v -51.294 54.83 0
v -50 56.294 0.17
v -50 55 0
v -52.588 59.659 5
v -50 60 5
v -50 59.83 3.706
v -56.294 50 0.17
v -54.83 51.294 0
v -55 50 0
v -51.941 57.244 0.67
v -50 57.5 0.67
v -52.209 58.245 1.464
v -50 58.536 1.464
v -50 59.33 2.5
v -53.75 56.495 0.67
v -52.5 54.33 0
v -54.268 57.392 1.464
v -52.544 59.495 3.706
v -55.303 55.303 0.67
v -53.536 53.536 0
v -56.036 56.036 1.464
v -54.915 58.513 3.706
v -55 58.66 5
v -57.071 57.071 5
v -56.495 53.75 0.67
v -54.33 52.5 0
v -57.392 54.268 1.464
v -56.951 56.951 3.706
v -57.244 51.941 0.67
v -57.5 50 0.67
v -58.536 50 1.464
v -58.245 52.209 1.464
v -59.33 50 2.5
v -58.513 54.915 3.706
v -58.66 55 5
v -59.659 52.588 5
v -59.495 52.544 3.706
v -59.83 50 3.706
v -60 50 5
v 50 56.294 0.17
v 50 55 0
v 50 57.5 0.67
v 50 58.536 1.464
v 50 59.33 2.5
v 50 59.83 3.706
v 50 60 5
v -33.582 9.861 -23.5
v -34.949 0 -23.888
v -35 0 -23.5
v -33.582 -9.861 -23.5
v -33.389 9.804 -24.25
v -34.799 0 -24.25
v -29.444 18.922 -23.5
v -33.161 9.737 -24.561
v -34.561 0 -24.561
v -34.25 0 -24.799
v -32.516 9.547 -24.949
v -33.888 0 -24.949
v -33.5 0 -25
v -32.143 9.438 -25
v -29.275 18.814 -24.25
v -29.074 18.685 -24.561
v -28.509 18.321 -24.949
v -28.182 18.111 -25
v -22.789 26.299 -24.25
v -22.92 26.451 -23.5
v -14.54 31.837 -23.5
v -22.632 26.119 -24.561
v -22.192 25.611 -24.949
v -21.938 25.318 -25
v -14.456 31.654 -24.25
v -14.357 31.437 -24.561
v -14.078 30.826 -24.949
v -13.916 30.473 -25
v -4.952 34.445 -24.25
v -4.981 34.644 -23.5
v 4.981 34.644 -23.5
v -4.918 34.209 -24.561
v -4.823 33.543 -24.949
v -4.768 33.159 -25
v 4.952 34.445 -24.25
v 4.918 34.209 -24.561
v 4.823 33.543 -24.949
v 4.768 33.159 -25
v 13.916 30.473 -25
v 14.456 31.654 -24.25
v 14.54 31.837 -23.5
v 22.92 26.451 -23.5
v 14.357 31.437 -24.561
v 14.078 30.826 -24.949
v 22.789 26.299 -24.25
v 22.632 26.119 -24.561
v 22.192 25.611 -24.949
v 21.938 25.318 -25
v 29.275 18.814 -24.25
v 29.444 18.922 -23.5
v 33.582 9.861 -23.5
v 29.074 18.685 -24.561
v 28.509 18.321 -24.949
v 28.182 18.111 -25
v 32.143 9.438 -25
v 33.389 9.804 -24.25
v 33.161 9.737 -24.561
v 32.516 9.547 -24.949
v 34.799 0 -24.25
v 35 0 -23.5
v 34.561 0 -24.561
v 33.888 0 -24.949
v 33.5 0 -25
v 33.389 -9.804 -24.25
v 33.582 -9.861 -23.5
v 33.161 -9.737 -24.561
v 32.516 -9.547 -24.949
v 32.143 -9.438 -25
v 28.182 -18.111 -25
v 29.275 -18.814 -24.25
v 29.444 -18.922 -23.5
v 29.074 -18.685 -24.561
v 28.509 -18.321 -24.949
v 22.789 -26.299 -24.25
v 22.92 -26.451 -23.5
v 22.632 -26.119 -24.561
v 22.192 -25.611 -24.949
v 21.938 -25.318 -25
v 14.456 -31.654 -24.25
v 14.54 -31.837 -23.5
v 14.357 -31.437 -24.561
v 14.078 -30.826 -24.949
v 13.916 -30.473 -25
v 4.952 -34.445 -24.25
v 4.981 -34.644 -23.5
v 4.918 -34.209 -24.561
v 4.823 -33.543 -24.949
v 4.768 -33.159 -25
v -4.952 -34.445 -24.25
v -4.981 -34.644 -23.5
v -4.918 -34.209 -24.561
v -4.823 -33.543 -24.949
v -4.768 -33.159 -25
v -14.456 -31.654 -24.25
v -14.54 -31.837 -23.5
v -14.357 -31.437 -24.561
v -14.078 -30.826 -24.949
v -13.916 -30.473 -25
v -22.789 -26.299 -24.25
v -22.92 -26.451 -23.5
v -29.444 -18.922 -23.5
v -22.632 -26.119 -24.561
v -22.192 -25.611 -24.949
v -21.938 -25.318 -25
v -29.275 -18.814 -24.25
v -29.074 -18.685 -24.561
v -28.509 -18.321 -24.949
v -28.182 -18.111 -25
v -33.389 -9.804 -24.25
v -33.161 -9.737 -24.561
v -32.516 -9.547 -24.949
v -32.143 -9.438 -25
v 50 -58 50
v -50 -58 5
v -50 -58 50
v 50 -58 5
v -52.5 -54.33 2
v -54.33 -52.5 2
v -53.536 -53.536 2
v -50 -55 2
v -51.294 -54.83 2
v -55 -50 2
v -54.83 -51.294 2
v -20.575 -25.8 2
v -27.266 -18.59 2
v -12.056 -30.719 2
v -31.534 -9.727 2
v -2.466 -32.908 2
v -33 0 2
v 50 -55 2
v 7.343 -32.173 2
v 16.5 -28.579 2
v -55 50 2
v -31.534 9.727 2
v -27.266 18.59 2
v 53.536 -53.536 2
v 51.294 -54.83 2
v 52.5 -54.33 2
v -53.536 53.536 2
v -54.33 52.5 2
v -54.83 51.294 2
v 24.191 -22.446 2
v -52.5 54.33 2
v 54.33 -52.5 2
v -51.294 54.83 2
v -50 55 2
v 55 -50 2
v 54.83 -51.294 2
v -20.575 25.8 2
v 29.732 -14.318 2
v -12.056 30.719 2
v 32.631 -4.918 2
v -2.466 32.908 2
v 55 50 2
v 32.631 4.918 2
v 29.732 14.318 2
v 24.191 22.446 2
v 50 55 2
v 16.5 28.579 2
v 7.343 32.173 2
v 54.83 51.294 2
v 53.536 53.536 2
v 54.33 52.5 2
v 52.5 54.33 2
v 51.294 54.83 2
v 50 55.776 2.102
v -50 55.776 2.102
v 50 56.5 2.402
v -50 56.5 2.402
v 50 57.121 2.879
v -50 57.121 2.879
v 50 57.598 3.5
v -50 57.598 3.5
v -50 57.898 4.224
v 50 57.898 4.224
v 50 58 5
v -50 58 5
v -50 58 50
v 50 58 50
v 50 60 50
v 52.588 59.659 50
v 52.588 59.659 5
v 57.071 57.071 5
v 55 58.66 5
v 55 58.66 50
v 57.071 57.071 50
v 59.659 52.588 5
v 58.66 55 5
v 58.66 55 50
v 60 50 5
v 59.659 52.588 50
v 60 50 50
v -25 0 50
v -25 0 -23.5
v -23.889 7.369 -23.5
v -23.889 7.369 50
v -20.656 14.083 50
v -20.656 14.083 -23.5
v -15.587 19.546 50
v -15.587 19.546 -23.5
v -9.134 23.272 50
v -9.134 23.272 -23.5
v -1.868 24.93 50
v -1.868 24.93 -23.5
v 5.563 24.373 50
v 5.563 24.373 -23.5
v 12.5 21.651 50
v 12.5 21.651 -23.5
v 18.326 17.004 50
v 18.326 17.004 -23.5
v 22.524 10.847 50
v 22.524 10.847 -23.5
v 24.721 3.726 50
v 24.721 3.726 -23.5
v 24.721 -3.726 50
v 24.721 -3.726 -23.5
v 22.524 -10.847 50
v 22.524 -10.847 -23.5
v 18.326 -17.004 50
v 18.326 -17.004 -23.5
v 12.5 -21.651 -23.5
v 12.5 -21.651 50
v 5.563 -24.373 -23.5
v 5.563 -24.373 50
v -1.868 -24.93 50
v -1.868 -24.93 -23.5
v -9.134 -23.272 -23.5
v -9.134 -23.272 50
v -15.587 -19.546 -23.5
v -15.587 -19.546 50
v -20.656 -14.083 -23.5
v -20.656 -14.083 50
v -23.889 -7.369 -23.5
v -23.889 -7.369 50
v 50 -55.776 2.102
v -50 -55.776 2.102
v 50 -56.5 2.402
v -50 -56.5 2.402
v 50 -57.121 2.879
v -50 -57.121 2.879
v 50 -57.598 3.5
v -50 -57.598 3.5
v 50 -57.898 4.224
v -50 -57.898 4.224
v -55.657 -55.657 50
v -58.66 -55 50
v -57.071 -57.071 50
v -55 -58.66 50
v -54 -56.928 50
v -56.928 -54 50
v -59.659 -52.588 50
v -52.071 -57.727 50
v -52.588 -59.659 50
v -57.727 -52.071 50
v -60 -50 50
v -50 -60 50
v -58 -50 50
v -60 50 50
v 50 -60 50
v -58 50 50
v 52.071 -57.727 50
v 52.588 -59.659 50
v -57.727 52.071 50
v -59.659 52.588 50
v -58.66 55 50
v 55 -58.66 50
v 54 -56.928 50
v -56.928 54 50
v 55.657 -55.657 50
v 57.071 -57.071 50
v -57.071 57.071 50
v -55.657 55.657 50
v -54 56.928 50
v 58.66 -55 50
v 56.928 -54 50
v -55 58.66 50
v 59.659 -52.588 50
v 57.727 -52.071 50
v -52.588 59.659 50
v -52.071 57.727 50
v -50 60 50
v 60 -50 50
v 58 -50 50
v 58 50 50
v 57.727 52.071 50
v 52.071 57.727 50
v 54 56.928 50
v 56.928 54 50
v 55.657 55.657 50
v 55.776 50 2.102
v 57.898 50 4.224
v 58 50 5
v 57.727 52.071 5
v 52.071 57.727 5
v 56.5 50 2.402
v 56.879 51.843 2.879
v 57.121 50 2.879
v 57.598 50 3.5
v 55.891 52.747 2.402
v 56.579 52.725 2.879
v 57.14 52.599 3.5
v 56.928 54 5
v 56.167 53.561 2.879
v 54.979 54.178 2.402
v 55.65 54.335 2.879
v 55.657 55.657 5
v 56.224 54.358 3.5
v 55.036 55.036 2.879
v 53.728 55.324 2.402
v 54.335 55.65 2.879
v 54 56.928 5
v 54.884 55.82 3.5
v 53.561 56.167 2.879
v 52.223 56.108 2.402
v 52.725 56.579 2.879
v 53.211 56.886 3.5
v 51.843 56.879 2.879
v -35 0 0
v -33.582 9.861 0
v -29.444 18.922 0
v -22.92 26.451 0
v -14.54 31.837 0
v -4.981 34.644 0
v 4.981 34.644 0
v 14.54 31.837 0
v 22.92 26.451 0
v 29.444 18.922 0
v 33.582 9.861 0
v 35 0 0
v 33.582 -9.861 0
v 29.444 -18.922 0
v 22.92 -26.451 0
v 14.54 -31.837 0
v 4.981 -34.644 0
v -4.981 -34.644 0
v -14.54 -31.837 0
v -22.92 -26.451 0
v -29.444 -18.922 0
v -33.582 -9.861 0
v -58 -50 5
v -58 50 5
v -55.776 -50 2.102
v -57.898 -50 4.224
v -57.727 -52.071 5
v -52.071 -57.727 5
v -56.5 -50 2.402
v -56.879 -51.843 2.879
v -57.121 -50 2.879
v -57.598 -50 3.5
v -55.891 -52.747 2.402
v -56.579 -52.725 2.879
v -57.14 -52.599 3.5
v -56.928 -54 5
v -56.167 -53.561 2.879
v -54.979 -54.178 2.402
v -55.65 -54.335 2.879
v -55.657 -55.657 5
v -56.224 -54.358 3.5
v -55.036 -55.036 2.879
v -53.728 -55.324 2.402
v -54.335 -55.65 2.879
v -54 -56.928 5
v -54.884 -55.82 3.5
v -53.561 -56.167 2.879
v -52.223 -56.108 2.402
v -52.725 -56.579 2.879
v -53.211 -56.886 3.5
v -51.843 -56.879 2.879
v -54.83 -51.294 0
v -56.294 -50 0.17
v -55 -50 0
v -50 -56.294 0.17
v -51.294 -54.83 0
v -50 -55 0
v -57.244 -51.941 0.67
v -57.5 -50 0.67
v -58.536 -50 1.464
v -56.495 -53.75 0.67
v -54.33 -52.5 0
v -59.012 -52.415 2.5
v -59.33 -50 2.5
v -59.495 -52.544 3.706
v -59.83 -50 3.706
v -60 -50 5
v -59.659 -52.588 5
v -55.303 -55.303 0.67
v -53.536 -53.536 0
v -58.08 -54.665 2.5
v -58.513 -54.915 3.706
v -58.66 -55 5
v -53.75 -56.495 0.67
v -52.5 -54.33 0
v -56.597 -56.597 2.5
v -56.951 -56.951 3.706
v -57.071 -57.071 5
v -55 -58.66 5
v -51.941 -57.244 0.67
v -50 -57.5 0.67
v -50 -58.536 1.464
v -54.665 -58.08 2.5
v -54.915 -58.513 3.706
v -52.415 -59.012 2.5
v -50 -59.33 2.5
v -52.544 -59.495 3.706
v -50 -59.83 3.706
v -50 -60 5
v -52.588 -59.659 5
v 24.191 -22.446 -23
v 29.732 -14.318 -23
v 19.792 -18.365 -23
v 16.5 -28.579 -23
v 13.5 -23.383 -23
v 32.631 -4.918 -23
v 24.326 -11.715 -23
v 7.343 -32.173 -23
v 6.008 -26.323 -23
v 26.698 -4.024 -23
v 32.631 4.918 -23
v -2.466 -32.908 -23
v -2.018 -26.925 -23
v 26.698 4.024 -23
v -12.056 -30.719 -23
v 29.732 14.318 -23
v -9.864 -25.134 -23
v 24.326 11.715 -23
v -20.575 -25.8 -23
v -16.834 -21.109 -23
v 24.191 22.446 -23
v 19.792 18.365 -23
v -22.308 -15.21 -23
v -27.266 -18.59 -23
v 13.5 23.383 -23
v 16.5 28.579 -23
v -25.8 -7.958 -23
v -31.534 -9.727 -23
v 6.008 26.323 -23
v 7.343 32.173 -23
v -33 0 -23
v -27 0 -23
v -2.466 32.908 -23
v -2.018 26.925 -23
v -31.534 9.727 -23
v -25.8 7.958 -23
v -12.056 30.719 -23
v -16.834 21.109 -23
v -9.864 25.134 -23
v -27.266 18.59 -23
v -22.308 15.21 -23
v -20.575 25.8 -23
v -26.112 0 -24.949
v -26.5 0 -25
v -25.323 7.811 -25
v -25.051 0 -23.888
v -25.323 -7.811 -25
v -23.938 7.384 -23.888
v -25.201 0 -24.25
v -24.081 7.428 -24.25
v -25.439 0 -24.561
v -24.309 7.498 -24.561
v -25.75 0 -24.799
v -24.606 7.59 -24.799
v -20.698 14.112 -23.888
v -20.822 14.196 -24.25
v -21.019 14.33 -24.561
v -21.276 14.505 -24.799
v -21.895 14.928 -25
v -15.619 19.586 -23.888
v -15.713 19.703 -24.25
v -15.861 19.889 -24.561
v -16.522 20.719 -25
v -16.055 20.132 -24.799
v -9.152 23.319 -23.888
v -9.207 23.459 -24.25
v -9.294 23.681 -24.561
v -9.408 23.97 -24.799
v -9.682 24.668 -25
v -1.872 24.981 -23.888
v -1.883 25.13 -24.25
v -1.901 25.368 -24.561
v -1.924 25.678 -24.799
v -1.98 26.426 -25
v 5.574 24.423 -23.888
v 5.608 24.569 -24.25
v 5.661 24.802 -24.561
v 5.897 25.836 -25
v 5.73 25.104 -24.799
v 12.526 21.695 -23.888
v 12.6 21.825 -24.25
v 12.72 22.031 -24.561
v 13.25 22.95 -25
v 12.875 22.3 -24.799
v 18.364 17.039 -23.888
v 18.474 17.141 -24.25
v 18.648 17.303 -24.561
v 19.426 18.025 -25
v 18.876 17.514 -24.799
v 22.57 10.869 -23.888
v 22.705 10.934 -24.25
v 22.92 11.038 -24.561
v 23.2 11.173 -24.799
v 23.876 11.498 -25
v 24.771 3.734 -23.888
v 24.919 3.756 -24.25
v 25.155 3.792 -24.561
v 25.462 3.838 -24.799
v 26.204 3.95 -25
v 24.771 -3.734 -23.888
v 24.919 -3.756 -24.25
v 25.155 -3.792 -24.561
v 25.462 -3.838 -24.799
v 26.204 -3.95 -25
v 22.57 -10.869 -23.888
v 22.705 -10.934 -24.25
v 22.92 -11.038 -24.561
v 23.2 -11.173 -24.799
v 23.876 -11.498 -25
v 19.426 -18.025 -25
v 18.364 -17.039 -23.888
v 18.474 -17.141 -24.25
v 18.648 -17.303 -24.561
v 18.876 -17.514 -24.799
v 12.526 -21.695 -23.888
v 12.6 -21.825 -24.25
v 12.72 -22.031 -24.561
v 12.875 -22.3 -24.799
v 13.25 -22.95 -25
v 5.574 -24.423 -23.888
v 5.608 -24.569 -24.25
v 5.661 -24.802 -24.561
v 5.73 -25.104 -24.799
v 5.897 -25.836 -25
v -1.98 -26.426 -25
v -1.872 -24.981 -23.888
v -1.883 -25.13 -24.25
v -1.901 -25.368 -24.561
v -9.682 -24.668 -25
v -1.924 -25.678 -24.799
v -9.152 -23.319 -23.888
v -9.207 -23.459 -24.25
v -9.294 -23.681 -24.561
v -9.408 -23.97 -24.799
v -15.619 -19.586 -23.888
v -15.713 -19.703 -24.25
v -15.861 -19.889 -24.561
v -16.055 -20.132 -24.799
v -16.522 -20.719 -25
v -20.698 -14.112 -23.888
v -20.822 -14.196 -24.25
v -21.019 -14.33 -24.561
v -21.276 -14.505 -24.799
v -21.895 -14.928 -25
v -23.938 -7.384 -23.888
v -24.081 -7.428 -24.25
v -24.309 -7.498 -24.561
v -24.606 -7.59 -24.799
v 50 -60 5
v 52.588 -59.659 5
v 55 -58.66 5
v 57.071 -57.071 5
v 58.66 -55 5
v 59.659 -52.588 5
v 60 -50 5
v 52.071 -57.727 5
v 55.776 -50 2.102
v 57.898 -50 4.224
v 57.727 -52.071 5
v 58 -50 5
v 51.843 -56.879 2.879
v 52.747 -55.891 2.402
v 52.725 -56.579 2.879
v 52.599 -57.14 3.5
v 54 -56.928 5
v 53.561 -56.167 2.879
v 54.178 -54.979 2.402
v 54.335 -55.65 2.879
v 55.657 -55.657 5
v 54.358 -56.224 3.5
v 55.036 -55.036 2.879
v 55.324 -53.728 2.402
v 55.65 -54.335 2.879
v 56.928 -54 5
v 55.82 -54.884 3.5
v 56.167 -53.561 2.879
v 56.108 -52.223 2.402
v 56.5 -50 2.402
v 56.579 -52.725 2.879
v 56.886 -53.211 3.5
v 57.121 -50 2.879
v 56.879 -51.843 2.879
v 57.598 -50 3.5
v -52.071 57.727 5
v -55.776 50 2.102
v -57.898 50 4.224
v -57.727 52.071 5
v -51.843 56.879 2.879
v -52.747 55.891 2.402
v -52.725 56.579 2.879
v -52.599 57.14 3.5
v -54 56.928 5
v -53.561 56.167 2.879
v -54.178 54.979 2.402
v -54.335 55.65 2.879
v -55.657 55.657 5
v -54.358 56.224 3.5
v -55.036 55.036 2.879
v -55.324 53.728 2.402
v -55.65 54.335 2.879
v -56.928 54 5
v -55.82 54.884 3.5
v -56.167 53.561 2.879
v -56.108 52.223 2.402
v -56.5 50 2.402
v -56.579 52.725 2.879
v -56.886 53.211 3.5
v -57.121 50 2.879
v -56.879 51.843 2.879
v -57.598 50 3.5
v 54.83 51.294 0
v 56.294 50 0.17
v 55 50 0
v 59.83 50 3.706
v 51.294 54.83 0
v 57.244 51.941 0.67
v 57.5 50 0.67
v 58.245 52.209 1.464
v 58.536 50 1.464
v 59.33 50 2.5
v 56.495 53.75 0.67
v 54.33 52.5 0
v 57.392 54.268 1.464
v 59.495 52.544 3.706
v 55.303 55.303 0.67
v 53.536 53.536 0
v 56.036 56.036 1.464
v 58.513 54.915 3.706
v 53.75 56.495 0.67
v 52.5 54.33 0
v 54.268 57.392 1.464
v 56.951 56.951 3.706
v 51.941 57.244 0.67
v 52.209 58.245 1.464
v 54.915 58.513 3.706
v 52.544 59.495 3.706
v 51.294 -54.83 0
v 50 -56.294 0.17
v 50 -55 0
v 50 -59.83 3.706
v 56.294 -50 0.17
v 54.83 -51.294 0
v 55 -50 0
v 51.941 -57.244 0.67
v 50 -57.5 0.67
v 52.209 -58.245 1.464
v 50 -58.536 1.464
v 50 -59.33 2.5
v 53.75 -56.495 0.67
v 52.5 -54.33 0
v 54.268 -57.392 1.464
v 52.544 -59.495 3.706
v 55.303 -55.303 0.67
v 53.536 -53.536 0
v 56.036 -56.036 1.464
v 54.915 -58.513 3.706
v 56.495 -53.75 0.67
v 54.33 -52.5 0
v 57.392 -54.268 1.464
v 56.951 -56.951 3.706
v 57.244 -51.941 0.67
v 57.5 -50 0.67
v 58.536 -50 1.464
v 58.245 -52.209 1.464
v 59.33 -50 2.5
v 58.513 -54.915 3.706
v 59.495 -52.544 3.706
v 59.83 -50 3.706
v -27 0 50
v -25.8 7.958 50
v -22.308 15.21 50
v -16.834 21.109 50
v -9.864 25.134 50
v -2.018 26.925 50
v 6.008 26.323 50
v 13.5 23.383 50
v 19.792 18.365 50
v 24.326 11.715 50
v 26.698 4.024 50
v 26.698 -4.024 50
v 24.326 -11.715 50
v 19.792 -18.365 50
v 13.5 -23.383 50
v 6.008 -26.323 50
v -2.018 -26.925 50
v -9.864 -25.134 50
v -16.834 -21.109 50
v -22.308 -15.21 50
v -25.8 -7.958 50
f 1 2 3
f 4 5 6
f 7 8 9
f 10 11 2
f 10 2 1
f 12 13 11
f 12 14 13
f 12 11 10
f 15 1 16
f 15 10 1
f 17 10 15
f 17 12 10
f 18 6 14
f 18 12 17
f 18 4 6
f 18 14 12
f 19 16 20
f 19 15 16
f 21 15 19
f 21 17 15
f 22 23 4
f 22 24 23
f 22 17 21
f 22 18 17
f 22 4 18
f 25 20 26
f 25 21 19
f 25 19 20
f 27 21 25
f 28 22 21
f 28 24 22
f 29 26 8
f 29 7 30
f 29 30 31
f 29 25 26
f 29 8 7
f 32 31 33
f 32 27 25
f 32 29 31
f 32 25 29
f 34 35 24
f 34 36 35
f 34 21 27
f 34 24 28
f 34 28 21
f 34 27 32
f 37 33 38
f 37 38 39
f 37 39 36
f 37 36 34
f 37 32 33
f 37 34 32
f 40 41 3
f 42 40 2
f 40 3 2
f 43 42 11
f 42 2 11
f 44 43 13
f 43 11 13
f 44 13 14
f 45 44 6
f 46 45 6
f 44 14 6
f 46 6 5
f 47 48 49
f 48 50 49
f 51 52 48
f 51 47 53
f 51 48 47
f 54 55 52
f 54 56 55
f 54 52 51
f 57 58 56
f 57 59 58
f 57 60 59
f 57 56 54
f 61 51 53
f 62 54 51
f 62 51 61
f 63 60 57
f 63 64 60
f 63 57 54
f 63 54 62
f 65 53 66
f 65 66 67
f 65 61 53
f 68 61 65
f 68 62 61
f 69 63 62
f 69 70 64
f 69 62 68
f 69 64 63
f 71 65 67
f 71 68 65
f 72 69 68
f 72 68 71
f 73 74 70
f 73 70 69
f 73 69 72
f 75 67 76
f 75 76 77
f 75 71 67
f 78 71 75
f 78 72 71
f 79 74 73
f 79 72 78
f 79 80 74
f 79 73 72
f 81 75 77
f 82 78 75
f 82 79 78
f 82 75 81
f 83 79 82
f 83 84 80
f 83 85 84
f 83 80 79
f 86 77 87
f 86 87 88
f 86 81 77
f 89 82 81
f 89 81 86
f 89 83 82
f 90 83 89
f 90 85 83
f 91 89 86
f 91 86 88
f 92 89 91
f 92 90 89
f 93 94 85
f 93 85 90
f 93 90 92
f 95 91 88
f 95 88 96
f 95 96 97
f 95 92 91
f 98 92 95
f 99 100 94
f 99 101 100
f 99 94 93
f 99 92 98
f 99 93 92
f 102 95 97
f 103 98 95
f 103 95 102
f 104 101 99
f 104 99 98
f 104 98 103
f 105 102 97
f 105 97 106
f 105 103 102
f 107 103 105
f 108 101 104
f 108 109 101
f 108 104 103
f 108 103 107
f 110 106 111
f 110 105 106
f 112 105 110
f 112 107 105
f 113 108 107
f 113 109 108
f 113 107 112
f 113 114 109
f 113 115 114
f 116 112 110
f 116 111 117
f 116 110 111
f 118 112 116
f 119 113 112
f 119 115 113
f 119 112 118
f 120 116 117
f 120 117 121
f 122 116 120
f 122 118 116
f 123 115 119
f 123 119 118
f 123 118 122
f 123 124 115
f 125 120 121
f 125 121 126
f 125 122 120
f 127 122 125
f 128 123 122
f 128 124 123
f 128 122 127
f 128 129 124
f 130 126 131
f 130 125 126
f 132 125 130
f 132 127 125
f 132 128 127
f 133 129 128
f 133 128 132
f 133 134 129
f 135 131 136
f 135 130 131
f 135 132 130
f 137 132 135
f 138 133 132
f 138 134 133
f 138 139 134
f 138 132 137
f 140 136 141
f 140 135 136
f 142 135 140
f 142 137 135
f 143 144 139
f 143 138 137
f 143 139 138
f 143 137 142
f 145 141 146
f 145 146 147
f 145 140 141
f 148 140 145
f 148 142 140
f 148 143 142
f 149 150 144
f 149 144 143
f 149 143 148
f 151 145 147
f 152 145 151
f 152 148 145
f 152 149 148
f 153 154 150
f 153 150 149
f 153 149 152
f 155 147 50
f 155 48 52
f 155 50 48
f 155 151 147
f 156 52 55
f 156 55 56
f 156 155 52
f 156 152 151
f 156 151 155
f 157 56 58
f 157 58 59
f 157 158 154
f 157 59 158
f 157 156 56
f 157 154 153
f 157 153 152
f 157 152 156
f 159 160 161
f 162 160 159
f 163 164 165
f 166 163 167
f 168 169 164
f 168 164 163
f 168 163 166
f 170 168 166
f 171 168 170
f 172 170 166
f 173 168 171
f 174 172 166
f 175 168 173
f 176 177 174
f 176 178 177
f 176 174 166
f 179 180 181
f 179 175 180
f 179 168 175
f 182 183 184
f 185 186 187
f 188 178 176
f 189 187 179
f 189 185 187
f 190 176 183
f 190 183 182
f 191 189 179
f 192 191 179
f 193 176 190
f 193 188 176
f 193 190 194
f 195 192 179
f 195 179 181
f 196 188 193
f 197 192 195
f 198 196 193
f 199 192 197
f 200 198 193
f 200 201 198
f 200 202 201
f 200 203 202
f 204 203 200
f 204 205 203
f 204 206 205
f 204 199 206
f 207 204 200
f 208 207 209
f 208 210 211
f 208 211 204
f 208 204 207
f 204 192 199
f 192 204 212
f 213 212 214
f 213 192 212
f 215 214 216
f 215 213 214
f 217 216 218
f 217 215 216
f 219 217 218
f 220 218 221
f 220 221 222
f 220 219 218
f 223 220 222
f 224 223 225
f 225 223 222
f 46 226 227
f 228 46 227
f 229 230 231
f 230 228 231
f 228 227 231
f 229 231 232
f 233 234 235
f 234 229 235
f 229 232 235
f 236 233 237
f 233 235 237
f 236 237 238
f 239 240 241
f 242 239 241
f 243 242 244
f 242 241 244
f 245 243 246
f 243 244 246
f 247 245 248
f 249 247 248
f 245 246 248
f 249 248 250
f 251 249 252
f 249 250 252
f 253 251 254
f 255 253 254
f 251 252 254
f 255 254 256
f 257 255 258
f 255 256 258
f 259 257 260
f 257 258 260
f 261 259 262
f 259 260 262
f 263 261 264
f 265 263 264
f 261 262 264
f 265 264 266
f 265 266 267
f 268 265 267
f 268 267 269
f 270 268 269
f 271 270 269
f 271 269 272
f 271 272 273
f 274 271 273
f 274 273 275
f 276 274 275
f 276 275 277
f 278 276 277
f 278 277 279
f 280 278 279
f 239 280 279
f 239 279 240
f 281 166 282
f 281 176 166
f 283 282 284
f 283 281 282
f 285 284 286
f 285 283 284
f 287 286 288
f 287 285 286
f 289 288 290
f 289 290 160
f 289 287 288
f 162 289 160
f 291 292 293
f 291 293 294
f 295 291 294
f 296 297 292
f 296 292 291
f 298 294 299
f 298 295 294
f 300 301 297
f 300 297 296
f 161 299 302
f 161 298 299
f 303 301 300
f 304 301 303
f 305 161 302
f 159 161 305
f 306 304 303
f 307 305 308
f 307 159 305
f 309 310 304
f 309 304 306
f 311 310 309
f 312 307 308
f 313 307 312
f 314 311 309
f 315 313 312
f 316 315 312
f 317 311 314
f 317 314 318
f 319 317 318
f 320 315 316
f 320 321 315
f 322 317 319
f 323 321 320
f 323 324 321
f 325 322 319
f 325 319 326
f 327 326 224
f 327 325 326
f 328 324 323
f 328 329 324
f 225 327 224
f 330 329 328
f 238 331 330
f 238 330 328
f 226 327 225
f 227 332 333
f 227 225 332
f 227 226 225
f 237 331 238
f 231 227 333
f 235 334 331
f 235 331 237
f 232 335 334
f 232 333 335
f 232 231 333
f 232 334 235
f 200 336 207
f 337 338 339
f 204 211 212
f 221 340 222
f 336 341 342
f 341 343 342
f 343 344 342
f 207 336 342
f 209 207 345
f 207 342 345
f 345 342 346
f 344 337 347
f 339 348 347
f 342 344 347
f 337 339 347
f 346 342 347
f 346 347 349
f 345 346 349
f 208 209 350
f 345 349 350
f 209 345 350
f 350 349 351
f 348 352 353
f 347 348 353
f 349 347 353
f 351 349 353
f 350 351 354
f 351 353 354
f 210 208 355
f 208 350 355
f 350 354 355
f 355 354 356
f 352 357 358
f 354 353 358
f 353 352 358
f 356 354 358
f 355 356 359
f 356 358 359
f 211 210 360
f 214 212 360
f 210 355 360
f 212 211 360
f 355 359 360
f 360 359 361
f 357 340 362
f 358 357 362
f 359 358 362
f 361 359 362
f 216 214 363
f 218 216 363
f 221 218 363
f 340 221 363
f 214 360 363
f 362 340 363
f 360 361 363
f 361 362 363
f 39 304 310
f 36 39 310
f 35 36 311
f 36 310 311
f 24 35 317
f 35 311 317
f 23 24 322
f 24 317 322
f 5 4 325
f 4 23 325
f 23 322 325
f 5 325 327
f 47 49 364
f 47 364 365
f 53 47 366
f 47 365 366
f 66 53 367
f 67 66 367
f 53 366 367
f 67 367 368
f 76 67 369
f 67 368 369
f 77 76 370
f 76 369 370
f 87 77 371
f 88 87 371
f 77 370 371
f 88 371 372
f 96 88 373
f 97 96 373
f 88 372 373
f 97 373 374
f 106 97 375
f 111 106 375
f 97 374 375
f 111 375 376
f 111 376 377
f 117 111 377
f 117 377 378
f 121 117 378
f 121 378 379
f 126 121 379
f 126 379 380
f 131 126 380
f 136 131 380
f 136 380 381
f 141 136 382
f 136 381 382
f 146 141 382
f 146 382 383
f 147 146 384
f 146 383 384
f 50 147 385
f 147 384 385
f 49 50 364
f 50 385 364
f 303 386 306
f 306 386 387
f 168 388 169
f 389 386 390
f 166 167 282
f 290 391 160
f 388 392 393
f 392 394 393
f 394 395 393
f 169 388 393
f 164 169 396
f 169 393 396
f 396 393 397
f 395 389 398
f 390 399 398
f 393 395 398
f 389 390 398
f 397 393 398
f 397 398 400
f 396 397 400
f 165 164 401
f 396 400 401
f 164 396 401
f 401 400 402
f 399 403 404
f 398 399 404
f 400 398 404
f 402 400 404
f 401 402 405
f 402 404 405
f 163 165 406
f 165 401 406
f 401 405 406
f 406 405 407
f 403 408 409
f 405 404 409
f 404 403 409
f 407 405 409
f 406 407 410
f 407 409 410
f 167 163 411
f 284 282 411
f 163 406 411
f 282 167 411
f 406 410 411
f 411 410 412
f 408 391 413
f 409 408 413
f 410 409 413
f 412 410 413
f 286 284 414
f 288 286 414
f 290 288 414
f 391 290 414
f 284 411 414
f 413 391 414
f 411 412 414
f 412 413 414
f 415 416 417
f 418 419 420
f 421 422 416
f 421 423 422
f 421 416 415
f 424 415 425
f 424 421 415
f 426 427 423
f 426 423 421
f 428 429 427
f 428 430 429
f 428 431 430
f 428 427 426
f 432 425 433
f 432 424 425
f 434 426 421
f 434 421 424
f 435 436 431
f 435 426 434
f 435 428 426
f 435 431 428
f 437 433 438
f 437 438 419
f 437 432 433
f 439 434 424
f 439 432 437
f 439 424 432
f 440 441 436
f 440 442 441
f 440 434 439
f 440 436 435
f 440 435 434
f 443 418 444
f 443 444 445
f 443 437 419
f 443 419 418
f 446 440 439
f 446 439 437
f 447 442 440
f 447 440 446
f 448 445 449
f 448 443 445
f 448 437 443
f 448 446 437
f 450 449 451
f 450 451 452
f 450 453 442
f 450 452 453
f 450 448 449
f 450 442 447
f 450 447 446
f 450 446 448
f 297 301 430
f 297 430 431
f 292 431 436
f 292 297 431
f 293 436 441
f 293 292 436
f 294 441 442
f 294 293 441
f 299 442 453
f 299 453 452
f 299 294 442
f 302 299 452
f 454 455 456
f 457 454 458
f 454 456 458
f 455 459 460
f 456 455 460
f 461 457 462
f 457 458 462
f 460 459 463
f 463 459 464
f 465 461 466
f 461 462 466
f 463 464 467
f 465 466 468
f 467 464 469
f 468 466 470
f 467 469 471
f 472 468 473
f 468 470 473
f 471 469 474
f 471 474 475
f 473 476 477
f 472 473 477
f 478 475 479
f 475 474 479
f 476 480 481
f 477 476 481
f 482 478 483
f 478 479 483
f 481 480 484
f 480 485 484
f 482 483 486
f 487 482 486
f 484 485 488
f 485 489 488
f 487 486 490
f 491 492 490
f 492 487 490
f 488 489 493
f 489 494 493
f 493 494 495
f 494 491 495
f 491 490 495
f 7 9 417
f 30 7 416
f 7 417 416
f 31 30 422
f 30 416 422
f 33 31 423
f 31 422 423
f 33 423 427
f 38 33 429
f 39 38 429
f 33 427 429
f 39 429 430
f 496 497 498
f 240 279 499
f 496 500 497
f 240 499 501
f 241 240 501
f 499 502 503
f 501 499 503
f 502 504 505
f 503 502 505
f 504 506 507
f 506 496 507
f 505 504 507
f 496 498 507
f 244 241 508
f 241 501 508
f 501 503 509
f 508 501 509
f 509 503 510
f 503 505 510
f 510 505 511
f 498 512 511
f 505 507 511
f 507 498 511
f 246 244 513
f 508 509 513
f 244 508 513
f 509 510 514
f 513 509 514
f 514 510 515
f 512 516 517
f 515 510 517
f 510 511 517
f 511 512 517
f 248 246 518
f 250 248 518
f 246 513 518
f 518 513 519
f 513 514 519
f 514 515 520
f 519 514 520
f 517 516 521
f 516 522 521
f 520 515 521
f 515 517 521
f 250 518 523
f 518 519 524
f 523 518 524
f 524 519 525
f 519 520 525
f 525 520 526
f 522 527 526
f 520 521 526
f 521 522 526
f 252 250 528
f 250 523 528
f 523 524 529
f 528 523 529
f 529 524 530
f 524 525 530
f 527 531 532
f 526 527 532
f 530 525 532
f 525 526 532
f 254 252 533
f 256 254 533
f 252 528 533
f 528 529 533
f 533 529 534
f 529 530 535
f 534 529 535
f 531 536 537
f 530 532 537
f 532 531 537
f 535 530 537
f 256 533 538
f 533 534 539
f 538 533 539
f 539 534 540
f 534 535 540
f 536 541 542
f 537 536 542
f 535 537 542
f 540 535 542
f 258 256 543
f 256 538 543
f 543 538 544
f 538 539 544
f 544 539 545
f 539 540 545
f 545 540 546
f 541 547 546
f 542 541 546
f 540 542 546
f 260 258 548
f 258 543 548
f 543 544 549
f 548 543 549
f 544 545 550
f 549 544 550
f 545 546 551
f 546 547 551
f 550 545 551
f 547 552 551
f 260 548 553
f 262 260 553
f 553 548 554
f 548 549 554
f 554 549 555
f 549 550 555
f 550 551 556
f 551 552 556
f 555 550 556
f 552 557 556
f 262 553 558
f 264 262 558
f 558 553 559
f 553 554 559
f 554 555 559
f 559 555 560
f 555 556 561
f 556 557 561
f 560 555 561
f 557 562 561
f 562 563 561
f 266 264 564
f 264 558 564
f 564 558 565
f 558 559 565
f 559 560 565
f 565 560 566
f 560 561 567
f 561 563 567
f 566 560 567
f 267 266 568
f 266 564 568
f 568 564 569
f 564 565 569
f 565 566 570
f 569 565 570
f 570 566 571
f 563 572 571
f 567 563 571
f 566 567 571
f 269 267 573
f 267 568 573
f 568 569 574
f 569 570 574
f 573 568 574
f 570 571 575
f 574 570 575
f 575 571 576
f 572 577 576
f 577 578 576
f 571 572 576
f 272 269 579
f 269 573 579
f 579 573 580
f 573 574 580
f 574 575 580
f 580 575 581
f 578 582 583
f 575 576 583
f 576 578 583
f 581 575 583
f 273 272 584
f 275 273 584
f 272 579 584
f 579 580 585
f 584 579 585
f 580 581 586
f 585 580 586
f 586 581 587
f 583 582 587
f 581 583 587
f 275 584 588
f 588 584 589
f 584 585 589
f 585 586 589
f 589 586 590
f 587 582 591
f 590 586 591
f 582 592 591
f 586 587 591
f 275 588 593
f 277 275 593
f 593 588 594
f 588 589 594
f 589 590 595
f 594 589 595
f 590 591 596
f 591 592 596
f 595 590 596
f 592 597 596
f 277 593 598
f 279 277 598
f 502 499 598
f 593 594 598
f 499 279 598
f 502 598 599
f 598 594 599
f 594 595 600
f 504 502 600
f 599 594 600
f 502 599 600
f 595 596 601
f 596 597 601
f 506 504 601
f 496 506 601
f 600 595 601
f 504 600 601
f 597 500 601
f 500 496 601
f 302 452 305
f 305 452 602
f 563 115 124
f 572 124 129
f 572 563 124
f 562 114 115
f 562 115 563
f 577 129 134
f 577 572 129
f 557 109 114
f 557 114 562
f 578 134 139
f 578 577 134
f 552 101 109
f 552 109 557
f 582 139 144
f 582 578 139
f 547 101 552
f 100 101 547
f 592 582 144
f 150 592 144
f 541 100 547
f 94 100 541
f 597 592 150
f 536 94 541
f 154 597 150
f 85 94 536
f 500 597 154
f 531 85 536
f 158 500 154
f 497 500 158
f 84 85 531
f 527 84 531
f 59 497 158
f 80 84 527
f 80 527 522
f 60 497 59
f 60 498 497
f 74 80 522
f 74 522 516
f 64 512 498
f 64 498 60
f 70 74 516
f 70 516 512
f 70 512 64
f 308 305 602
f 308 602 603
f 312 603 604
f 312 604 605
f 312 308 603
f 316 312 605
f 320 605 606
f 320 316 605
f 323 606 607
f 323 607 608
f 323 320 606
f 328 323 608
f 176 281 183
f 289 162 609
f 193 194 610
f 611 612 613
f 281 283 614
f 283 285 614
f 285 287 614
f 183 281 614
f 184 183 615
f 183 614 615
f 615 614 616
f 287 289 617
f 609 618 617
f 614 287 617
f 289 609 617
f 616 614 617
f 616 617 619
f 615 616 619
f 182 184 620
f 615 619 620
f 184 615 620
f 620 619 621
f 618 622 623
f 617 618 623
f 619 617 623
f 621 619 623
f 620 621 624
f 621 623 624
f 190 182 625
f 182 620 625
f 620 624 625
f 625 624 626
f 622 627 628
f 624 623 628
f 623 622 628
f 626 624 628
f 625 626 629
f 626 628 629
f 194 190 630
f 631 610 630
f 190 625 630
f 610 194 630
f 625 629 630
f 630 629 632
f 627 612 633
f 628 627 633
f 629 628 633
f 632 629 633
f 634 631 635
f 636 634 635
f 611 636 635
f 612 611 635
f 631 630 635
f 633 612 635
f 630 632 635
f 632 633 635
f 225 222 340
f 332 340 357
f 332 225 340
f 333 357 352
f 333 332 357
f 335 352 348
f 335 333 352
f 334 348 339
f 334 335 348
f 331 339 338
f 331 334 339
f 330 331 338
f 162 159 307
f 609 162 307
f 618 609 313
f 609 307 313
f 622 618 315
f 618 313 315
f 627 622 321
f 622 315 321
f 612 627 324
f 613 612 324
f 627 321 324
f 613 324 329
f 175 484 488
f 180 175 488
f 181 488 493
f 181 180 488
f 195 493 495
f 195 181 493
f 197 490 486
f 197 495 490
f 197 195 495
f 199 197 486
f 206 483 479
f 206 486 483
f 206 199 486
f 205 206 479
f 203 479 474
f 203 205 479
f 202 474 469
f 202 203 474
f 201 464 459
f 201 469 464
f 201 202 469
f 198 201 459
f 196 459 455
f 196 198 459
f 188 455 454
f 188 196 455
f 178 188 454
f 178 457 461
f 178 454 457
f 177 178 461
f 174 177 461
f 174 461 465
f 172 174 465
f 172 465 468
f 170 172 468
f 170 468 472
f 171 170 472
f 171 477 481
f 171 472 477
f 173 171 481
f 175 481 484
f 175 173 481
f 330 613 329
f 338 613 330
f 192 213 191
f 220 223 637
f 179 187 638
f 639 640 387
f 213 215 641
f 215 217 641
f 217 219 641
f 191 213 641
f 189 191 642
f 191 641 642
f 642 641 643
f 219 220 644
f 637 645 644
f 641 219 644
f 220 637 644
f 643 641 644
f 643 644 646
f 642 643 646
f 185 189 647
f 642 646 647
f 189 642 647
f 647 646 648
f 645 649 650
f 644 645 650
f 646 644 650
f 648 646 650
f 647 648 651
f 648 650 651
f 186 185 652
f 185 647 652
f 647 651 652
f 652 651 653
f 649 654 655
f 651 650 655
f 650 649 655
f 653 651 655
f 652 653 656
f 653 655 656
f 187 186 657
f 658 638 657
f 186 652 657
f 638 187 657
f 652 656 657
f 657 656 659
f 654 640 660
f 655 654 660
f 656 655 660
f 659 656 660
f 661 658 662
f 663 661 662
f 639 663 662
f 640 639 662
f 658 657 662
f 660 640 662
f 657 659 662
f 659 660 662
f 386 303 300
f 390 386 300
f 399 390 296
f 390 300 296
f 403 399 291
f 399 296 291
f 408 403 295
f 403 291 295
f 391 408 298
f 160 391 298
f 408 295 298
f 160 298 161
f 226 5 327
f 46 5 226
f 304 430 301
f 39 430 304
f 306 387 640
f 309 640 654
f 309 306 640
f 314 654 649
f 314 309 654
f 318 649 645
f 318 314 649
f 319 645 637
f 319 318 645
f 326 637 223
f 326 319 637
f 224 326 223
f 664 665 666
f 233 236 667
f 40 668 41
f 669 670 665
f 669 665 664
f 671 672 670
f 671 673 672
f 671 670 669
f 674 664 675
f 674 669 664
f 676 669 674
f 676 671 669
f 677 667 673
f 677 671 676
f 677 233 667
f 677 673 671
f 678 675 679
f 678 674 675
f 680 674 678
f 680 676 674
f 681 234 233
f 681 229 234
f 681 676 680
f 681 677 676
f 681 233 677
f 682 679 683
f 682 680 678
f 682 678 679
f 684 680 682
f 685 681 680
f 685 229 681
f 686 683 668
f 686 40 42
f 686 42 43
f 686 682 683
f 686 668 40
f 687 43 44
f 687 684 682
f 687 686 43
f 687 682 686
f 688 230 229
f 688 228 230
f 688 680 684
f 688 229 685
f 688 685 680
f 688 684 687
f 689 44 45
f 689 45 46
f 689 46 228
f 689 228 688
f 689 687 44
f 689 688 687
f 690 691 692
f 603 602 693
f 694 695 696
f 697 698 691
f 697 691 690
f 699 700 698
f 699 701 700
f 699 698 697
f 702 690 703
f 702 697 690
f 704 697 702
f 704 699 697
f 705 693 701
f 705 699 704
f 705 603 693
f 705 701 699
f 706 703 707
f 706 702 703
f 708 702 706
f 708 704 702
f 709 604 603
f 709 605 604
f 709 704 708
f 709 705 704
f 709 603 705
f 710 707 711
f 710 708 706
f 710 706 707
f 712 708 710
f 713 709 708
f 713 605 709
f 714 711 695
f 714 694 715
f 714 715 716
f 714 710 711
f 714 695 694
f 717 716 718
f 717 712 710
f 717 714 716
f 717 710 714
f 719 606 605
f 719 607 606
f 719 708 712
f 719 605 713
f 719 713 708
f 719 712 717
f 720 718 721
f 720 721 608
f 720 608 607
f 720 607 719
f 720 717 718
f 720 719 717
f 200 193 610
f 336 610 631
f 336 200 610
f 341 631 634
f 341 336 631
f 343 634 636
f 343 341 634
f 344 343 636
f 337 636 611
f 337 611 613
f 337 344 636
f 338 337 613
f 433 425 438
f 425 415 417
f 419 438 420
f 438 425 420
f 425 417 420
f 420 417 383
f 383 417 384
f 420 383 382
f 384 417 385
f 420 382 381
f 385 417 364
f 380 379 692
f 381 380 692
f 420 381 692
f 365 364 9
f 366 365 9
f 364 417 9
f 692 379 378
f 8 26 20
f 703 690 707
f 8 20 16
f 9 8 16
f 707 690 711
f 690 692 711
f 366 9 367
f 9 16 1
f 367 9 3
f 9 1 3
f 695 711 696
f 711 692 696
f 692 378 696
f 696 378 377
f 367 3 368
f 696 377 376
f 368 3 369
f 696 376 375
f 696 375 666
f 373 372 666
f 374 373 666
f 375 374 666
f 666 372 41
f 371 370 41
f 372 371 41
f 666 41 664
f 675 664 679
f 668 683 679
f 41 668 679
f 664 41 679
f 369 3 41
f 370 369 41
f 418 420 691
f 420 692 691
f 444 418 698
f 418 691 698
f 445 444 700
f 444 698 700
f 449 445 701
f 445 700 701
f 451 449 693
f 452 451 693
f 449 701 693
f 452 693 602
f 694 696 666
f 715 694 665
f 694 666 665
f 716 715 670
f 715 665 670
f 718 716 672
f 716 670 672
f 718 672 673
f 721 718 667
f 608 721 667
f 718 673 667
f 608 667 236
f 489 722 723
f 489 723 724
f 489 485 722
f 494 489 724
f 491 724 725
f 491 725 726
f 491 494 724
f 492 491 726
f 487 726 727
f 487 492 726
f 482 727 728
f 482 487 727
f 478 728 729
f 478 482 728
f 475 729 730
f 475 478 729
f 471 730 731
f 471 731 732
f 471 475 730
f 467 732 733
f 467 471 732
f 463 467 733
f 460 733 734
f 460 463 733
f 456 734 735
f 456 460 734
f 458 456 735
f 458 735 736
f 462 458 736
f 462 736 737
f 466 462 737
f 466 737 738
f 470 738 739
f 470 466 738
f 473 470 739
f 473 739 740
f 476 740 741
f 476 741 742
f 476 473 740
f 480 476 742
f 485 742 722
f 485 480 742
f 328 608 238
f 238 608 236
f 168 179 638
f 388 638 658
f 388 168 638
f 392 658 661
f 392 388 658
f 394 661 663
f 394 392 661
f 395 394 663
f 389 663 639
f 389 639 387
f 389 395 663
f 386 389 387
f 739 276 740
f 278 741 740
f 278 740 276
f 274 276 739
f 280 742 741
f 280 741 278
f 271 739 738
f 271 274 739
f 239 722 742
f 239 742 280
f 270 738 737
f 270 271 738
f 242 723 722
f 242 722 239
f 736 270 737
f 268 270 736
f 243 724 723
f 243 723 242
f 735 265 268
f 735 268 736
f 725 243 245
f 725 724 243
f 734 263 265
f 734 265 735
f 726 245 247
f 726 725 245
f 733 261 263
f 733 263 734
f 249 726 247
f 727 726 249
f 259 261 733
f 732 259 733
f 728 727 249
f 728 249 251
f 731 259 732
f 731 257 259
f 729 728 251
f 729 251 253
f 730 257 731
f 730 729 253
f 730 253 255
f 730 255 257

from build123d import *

# Parameters (mm, degrees)
SKETCH2_W           = 120
SKETCH2_H           = 120
BOSS_EXTRUDE1_DEPTH = 50
SKETCH3_R           = 35
BOSS_EXTRUDE2_DEPTH = 25
SKETCH4_R           = 25
CUT_EXTRUDE1_DEPTH  = 76
FILLET2_R           = 1.5
FILLET7_R           = 10
FILLET8_R           = 5
SHELL1_T            = -2


with BuildPart() as part:
    # Sketch2 → Boss-Extrude1 (new body)
    with BuildSketch(Plane.XY):
        Rectangle(SKETCH2_W, SKETCH2_H)
    extrude(amount=BOSS_EXTRUDE1_DEPTH)

    # Sketch3 → Boss-Extrude2 (add)
    with BuildSketch(Plane(origin=(0, 0, 0), x_dir=(-1, 0, 0), z_dir=(0, 0, -1))):
        Circle(SKETCH3_R)
    extrude(amount=BOSS_EXTRUDE2_DEPTH)

    # Sketch4 → Cut-Extrude1 (cut, through all)
    with BuildSketch(Plane(origin=(0, 0, -25), x_dir=(-1, 0, 0), z_dir=(0, 0, -1))):
        Circle(SKETCH4_R)
    extrude(amount=-CUT_EXTRUDE1_DEPTH, mode=Mode.SUBTRACT)

    # Fillet2
    fillet2_edges = [part.edges().sort_by_distance(p)[0] for p in [
        (35, 0, -25),
        (25, 0, -25),
    ]]
    fillet(fillet2_edges, radius=FILLET2_R)

    # Fillet7
    fillet7_edges = [part.edges().sort_by_distance(p)[0] for p in [
        (-60, 60, 25),
        (60, 60, 25),
        (60, -60, 25),
        (-60, -60, 25),
    ]]
    fillet(fillet7_edges, radius=FILLET7_R)

    # Fillet8
    fillet8_edges = [part.edges().sort_by_distance(p)[0] for p in [
        (0, -60, 0),
        (-60, 0, 0),
        (0, 60, 0),
        (60, 0, 0),
        (57.071067812, 57.071067812, 0),
        (-57.071067812, 57.071067812, 0),
        (57.071067812, -57.071067812, 0),
        (-57.071067812, -57.071067812, 0),
    ]]
    fillet(fillet8_edges, radius=FILLET8_R)

    # Shell1
    shell1_openings = [part.faces().sort_by_distance(p)[0] for p in [
        (-25, 0, 50),
    ]]
    offset(amount=SHELL1_T, openings=shell1_openings, kind=Kind.INTERSECTION)


solid = part.part
